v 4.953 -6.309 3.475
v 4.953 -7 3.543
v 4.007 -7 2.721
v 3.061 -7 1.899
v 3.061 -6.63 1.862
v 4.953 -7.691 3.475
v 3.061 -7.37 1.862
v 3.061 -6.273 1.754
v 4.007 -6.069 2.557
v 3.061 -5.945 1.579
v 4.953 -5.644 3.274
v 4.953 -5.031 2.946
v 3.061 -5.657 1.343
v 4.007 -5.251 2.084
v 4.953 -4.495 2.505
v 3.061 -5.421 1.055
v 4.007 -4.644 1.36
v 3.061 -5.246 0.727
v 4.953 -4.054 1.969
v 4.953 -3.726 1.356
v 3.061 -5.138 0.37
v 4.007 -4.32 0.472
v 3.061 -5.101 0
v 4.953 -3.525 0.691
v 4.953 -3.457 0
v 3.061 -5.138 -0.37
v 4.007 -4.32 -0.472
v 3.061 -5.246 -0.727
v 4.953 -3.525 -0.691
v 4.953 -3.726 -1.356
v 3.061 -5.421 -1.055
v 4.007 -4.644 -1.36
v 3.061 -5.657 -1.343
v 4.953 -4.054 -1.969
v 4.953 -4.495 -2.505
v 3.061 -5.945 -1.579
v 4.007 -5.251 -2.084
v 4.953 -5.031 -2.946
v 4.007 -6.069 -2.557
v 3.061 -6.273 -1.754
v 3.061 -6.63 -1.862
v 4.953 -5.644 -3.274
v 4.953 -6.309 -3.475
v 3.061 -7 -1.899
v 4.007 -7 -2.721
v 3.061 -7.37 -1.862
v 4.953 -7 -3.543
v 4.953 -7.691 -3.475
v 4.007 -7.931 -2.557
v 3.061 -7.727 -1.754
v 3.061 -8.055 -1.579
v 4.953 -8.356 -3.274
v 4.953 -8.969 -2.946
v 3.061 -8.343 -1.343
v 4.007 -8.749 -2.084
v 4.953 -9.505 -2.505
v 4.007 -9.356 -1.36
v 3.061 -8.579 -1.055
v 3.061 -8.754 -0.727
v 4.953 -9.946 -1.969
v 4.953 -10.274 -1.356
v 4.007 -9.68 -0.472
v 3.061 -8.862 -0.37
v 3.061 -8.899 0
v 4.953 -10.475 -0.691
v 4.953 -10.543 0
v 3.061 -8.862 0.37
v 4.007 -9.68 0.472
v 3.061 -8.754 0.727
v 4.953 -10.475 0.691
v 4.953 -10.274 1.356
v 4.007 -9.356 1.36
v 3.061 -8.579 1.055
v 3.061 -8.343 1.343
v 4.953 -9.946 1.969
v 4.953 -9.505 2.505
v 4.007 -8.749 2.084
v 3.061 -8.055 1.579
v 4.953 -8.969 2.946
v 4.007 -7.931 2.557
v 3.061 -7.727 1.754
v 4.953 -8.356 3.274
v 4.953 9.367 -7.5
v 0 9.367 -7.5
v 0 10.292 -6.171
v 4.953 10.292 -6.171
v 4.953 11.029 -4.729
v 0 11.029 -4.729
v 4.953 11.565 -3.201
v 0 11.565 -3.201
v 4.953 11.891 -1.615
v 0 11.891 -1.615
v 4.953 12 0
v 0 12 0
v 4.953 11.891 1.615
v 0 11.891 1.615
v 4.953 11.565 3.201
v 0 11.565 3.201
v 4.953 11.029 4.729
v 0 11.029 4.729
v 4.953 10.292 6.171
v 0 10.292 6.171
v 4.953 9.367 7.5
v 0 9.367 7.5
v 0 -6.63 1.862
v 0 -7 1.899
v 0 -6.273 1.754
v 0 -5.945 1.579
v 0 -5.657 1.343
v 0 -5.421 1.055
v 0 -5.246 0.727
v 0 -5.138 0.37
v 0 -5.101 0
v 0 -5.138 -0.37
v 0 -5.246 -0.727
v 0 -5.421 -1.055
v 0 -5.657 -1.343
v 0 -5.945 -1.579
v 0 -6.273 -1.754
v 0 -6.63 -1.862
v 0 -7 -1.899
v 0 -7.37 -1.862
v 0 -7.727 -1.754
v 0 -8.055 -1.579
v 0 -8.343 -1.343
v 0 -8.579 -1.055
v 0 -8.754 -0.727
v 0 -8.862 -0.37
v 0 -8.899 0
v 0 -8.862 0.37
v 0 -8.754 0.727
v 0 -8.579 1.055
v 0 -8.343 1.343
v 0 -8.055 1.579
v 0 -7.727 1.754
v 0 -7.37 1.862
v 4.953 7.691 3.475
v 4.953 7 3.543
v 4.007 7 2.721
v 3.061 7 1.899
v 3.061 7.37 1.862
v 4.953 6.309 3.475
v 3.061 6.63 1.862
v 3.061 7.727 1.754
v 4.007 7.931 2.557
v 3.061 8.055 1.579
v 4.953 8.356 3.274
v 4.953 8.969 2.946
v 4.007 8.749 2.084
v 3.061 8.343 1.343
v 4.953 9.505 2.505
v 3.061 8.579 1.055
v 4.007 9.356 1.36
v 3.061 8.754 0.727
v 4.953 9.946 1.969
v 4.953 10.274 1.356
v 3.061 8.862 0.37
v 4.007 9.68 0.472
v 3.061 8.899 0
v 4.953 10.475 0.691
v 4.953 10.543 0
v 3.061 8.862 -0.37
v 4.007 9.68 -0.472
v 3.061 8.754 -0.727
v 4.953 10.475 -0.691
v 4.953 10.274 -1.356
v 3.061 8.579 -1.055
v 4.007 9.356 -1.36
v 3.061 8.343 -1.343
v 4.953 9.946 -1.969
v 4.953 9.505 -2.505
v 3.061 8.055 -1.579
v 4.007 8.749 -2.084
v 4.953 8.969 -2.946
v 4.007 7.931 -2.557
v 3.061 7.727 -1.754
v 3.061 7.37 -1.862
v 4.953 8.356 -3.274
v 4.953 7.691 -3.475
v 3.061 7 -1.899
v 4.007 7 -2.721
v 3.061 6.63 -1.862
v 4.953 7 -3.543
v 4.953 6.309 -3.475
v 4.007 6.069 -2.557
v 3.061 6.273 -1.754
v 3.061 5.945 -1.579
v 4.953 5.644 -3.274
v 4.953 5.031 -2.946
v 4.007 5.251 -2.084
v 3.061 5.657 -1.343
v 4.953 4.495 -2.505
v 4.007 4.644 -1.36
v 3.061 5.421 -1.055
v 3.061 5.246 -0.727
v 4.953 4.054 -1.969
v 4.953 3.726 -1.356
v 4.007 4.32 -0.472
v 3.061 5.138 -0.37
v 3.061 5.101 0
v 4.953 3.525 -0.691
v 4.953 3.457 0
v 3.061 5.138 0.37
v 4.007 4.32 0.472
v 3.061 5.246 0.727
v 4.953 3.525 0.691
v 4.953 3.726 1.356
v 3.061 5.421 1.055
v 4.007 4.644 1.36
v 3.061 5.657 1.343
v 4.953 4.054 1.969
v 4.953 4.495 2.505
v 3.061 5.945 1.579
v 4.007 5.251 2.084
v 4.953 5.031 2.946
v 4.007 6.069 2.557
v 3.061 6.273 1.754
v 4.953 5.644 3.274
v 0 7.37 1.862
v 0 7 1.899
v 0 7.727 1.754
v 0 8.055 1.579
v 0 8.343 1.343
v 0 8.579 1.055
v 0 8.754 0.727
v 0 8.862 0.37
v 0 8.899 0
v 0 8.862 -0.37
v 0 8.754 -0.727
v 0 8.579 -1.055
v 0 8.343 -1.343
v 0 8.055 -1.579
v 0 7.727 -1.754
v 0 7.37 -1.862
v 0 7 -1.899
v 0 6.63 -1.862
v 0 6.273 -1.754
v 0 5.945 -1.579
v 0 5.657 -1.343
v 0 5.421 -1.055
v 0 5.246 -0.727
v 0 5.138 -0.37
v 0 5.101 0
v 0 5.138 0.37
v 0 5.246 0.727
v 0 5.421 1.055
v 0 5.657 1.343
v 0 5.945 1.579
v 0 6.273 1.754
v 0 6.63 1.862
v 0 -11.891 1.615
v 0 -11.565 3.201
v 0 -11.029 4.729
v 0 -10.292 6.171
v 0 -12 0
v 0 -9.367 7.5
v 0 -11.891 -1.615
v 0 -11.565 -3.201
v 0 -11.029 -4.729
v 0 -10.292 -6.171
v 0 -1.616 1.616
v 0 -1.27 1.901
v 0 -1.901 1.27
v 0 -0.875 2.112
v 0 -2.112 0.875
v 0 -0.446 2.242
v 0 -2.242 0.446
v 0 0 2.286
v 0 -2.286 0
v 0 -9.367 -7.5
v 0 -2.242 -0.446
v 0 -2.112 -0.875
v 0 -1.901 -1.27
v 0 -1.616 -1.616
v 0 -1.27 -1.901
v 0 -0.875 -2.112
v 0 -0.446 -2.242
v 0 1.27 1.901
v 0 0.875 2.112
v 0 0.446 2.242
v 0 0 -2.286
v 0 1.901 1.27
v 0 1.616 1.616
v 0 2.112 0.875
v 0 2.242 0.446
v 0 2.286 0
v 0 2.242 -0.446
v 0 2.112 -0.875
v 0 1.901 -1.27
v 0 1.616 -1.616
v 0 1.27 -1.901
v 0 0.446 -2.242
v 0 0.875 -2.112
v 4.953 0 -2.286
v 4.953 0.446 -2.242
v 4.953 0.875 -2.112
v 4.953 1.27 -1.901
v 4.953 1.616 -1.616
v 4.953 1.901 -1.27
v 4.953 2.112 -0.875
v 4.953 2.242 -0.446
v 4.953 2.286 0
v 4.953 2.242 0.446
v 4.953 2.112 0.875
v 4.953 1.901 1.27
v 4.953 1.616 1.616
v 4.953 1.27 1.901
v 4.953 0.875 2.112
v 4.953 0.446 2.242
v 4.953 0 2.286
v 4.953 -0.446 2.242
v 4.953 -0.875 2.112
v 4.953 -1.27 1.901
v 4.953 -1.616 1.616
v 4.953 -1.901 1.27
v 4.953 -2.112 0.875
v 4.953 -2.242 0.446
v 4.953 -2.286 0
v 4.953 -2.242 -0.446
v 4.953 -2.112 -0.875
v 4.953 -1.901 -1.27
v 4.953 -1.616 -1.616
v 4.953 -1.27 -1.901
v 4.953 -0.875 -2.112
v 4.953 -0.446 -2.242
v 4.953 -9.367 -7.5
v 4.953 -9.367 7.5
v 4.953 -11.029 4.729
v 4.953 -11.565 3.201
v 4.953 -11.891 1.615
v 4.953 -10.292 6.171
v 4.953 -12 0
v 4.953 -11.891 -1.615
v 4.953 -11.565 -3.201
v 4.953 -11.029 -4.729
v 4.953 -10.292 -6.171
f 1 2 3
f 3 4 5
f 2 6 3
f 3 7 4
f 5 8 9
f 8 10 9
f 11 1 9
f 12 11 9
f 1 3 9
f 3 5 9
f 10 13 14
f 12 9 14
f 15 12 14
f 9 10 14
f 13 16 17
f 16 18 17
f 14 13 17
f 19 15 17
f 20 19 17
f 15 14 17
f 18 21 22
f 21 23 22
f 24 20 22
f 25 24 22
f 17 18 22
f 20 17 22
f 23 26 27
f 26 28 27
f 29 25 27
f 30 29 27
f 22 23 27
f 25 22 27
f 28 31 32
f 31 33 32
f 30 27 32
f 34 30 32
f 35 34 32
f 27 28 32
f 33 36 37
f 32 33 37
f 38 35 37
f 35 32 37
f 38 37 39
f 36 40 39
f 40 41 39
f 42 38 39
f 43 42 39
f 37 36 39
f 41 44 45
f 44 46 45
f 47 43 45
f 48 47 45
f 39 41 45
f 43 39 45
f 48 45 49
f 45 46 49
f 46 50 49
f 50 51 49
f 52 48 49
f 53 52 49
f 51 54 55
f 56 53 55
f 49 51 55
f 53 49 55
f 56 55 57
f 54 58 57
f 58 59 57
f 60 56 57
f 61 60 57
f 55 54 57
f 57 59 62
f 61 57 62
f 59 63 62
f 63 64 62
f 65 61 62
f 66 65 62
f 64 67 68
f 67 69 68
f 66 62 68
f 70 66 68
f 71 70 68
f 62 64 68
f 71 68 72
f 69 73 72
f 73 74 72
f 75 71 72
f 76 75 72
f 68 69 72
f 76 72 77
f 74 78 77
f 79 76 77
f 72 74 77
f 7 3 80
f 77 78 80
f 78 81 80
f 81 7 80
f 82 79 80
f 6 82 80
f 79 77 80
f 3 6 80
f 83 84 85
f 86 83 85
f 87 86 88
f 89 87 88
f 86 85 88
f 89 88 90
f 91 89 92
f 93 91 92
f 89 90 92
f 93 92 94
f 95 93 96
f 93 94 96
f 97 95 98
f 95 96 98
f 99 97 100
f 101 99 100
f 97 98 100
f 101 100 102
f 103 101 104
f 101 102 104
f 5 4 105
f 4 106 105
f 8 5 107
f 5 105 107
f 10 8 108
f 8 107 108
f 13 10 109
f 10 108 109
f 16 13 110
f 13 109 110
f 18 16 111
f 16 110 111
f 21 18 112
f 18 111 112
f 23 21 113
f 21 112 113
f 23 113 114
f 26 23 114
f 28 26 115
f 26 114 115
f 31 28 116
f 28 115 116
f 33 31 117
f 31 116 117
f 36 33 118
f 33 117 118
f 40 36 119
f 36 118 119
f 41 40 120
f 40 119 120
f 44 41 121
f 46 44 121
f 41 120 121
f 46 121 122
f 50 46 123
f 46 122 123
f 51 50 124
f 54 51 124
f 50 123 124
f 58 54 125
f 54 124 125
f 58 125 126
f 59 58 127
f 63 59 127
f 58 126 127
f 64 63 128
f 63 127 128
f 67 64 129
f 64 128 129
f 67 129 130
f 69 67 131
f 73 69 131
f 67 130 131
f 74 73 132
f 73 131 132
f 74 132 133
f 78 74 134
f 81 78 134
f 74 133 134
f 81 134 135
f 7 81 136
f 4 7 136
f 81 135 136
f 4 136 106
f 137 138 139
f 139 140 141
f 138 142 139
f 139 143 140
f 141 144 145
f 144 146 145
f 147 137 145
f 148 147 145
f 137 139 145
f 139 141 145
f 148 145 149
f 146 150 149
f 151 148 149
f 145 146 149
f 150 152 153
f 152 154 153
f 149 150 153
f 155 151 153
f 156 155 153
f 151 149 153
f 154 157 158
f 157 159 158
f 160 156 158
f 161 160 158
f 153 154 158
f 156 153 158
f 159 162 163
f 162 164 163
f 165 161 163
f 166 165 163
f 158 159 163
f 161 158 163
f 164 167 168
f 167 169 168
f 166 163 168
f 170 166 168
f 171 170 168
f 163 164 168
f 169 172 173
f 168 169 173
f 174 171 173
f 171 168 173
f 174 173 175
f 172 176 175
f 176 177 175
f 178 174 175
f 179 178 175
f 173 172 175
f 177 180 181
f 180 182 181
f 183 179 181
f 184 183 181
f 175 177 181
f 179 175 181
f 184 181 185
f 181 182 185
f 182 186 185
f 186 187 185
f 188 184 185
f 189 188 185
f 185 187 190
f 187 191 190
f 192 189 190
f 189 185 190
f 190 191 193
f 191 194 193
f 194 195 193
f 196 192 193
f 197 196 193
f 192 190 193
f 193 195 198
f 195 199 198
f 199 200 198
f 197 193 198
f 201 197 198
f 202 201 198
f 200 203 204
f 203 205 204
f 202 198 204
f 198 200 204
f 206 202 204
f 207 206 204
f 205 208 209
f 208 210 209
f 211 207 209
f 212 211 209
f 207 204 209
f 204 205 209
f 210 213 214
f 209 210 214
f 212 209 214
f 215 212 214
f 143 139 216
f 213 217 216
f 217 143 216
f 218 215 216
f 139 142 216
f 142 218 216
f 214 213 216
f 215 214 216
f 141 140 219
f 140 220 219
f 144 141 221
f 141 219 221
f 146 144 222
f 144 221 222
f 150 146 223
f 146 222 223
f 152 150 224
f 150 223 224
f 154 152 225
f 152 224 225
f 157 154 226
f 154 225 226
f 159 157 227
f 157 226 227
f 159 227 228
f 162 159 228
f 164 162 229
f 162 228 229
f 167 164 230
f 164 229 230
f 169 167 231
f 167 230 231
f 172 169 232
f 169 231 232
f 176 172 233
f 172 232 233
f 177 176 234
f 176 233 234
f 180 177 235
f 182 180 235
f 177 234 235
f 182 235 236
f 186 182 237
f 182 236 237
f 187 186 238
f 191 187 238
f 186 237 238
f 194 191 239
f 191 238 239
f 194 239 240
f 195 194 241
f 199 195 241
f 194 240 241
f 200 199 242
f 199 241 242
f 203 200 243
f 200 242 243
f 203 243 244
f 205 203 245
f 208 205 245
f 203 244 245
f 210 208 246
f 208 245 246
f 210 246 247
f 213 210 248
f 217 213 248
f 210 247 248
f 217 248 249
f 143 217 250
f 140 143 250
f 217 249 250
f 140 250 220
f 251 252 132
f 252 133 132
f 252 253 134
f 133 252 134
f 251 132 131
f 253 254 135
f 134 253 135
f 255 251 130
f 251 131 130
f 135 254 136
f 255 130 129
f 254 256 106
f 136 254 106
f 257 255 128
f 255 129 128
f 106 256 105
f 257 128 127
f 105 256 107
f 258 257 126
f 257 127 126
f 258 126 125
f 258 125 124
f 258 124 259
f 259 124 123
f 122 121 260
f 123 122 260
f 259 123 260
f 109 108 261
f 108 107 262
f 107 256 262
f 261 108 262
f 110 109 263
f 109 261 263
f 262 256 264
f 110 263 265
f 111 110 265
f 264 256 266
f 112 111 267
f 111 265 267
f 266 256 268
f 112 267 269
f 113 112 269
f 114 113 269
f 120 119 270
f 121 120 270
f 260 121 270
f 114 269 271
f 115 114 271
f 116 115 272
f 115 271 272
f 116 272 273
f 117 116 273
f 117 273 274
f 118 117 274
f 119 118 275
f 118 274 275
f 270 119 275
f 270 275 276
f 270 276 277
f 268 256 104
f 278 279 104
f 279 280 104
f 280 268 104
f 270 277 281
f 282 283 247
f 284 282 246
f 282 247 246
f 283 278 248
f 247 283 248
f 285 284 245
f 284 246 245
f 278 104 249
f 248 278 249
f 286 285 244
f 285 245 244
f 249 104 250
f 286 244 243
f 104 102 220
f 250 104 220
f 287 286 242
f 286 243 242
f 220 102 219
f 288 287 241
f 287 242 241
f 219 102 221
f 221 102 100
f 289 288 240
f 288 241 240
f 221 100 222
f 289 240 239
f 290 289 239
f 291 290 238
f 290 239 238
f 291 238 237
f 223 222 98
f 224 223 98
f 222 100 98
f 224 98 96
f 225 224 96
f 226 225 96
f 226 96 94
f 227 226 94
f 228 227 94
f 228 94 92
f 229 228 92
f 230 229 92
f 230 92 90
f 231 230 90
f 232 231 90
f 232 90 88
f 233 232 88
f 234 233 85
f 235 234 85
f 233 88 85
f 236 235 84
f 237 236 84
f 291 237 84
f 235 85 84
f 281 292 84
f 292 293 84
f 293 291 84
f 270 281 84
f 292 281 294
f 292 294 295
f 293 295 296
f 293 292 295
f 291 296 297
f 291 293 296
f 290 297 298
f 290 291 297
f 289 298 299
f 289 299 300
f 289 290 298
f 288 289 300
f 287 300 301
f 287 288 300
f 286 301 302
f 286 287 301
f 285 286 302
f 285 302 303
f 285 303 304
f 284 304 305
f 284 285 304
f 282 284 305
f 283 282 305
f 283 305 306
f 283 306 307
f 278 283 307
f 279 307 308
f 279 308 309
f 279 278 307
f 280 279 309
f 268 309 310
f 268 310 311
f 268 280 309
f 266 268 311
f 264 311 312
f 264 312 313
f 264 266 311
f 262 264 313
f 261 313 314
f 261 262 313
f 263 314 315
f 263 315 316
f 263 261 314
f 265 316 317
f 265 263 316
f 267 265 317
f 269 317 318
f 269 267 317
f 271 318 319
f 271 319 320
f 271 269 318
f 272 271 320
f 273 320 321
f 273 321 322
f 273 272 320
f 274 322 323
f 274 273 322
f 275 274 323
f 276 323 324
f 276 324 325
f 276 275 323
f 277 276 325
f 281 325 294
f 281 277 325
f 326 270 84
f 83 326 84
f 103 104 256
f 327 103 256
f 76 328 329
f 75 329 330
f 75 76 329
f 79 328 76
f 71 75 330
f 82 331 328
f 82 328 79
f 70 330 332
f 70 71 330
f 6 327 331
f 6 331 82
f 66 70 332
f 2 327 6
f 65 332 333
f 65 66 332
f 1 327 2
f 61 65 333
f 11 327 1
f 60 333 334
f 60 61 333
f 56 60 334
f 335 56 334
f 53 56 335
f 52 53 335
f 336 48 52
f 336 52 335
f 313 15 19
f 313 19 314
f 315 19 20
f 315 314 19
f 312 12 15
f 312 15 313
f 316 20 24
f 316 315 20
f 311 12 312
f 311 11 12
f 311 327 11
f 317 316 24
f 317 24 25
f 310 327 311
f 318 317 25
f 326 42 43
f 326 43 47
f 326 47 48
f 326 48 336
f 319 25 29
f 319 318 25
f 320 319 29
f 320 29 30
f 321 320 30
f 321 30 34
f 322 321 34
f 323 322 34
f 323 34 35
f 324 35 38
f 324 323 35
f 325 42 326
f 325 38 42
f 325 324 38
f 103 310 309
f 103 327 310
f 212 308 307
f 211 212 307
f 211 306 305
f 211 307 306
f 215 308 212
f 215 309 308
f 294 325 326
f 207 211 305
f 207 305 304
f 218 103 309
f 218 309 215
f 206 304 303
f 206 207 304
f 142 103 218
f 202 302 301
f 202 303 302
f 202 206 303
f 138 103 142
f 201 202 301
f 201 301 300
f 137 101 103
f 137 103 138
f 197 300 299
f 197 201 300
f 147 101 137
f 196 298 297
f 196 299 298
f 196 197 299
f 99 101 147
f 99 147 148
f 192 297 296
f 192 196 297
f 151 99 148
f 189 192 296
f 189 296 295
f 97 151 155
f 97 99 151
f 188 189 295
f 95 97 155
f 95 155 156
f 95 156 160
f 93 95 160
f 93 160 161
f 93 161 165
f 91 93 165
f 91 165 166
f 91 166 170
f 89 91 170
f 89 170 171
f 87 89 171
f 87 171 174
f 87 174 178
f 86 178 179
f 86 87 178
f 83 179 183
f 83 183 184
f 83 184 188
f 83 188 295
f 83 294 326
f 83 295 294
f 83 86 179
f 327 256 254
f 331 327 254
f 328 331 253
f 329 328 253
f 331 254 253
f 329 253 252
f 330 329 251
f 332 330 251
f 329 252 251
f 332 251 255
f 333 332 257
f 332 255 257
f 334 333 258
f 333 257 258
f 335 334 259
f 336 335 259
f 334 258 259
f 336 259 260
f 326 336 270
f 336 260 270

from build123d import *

# Parameters (mm, degrees)
SKETCH1_R                                      = 1.7272
SKETCH1_R_2                                    = 2.286
BOSS_EXTRUDE1_DEPTH                            = 4.953
CSK_FOR_6_FLAT_HEAD_MACHINE_SCREW1_D           = 3.7973
CSK_FOR_6_FLAT_HEAD_MACHINE_SCREW1_DEPTH       = 10.973
CSK_FOR_6_FLAT_HEAD_MACHINE_SCREW1_CSINK_D     = 7.0866
CSK_FOR_6_FLAT_HEAD_MACHINE_SCREW1_CSINK_ANGLE = 82
CSK_FOR_6_FLAT_HEAD_MACHINE_SCREW1_TIP         = 1.140824014


with BuildPart() as part:
    # Sketch1 → Boss-Extrude1 (new body)
    with BuildSketch(Plane(origin=(0, 0, 0), x_dir=(0, 0, -1), z_dir=(1, 0, 0))):
        with BuildLine():
            Line((-7.5, 9.367496998), (-7.5, -9.367496998))
            ThreePointArc((-7.5, -9.367496998), (0, -12), (7.5, -9.367496998))
            Line((7.5, -9.367496998), (7.5, 9.367496998))
            ThreePointArc((7.5, 9.367496998), (0, 12), (-7.5, 9.367496998))
        make_face()
        with Locations((0, 7)):
            Circle(SKETCH1_R, mode=Mode.SUBTRACT)
        with Locations((0, -7)):
            Circle(SKETCH1_R, mode=Mode.SUBTRACT)
        Circle(SKETCH1_R_2, mode=Mode.SUBTRACT)
    extrude(amount=BOSS_EXTRUDE1_DEPTH)

    # CSK for #6 Flat Head Machine Screw1
    with Locations(Plane(origin=(4.953, 0, 0), x_dir=(0, 0, -1), z_dir=(1, 0, 0))):
        with Locations((0, -7), (0, 7)):
            CounterSinkHole(CSK_FOR_6_FLAT_HEAD_MACHINE_SCREW1_D / 2, CSK_FOR_6_FLAT_HEAD_MACHINE_SCREW1_CSINK_D / 2, depth=CSK_FOR_6_FLAT_HEAD_MACHINE_SCREW1_DEPTH, counter_sink_angle=CSK_FOR_6_FLAT_HEAD_MACHINE_SCREW1_CSINK_ANGLE)
            with Locations((0, 0, -(CSK_FOR_6_FLAT_HEAD_MACHINE_SCREW1_DEPTH + CSK_FOR_6_FLAT_HEAD_MACHINE_SCREW1_TIP / 2))):  # 118° drill point
                Cone(0, CSK_FOR_6_FLAT_HEAD_MACHINE_SCREW1_D / 2, CSK_FOR_6_FLAT_HEAD_MACHINE_SCREW1_TIP, mode=Mode.SUBTRACT)


solid = part.part
